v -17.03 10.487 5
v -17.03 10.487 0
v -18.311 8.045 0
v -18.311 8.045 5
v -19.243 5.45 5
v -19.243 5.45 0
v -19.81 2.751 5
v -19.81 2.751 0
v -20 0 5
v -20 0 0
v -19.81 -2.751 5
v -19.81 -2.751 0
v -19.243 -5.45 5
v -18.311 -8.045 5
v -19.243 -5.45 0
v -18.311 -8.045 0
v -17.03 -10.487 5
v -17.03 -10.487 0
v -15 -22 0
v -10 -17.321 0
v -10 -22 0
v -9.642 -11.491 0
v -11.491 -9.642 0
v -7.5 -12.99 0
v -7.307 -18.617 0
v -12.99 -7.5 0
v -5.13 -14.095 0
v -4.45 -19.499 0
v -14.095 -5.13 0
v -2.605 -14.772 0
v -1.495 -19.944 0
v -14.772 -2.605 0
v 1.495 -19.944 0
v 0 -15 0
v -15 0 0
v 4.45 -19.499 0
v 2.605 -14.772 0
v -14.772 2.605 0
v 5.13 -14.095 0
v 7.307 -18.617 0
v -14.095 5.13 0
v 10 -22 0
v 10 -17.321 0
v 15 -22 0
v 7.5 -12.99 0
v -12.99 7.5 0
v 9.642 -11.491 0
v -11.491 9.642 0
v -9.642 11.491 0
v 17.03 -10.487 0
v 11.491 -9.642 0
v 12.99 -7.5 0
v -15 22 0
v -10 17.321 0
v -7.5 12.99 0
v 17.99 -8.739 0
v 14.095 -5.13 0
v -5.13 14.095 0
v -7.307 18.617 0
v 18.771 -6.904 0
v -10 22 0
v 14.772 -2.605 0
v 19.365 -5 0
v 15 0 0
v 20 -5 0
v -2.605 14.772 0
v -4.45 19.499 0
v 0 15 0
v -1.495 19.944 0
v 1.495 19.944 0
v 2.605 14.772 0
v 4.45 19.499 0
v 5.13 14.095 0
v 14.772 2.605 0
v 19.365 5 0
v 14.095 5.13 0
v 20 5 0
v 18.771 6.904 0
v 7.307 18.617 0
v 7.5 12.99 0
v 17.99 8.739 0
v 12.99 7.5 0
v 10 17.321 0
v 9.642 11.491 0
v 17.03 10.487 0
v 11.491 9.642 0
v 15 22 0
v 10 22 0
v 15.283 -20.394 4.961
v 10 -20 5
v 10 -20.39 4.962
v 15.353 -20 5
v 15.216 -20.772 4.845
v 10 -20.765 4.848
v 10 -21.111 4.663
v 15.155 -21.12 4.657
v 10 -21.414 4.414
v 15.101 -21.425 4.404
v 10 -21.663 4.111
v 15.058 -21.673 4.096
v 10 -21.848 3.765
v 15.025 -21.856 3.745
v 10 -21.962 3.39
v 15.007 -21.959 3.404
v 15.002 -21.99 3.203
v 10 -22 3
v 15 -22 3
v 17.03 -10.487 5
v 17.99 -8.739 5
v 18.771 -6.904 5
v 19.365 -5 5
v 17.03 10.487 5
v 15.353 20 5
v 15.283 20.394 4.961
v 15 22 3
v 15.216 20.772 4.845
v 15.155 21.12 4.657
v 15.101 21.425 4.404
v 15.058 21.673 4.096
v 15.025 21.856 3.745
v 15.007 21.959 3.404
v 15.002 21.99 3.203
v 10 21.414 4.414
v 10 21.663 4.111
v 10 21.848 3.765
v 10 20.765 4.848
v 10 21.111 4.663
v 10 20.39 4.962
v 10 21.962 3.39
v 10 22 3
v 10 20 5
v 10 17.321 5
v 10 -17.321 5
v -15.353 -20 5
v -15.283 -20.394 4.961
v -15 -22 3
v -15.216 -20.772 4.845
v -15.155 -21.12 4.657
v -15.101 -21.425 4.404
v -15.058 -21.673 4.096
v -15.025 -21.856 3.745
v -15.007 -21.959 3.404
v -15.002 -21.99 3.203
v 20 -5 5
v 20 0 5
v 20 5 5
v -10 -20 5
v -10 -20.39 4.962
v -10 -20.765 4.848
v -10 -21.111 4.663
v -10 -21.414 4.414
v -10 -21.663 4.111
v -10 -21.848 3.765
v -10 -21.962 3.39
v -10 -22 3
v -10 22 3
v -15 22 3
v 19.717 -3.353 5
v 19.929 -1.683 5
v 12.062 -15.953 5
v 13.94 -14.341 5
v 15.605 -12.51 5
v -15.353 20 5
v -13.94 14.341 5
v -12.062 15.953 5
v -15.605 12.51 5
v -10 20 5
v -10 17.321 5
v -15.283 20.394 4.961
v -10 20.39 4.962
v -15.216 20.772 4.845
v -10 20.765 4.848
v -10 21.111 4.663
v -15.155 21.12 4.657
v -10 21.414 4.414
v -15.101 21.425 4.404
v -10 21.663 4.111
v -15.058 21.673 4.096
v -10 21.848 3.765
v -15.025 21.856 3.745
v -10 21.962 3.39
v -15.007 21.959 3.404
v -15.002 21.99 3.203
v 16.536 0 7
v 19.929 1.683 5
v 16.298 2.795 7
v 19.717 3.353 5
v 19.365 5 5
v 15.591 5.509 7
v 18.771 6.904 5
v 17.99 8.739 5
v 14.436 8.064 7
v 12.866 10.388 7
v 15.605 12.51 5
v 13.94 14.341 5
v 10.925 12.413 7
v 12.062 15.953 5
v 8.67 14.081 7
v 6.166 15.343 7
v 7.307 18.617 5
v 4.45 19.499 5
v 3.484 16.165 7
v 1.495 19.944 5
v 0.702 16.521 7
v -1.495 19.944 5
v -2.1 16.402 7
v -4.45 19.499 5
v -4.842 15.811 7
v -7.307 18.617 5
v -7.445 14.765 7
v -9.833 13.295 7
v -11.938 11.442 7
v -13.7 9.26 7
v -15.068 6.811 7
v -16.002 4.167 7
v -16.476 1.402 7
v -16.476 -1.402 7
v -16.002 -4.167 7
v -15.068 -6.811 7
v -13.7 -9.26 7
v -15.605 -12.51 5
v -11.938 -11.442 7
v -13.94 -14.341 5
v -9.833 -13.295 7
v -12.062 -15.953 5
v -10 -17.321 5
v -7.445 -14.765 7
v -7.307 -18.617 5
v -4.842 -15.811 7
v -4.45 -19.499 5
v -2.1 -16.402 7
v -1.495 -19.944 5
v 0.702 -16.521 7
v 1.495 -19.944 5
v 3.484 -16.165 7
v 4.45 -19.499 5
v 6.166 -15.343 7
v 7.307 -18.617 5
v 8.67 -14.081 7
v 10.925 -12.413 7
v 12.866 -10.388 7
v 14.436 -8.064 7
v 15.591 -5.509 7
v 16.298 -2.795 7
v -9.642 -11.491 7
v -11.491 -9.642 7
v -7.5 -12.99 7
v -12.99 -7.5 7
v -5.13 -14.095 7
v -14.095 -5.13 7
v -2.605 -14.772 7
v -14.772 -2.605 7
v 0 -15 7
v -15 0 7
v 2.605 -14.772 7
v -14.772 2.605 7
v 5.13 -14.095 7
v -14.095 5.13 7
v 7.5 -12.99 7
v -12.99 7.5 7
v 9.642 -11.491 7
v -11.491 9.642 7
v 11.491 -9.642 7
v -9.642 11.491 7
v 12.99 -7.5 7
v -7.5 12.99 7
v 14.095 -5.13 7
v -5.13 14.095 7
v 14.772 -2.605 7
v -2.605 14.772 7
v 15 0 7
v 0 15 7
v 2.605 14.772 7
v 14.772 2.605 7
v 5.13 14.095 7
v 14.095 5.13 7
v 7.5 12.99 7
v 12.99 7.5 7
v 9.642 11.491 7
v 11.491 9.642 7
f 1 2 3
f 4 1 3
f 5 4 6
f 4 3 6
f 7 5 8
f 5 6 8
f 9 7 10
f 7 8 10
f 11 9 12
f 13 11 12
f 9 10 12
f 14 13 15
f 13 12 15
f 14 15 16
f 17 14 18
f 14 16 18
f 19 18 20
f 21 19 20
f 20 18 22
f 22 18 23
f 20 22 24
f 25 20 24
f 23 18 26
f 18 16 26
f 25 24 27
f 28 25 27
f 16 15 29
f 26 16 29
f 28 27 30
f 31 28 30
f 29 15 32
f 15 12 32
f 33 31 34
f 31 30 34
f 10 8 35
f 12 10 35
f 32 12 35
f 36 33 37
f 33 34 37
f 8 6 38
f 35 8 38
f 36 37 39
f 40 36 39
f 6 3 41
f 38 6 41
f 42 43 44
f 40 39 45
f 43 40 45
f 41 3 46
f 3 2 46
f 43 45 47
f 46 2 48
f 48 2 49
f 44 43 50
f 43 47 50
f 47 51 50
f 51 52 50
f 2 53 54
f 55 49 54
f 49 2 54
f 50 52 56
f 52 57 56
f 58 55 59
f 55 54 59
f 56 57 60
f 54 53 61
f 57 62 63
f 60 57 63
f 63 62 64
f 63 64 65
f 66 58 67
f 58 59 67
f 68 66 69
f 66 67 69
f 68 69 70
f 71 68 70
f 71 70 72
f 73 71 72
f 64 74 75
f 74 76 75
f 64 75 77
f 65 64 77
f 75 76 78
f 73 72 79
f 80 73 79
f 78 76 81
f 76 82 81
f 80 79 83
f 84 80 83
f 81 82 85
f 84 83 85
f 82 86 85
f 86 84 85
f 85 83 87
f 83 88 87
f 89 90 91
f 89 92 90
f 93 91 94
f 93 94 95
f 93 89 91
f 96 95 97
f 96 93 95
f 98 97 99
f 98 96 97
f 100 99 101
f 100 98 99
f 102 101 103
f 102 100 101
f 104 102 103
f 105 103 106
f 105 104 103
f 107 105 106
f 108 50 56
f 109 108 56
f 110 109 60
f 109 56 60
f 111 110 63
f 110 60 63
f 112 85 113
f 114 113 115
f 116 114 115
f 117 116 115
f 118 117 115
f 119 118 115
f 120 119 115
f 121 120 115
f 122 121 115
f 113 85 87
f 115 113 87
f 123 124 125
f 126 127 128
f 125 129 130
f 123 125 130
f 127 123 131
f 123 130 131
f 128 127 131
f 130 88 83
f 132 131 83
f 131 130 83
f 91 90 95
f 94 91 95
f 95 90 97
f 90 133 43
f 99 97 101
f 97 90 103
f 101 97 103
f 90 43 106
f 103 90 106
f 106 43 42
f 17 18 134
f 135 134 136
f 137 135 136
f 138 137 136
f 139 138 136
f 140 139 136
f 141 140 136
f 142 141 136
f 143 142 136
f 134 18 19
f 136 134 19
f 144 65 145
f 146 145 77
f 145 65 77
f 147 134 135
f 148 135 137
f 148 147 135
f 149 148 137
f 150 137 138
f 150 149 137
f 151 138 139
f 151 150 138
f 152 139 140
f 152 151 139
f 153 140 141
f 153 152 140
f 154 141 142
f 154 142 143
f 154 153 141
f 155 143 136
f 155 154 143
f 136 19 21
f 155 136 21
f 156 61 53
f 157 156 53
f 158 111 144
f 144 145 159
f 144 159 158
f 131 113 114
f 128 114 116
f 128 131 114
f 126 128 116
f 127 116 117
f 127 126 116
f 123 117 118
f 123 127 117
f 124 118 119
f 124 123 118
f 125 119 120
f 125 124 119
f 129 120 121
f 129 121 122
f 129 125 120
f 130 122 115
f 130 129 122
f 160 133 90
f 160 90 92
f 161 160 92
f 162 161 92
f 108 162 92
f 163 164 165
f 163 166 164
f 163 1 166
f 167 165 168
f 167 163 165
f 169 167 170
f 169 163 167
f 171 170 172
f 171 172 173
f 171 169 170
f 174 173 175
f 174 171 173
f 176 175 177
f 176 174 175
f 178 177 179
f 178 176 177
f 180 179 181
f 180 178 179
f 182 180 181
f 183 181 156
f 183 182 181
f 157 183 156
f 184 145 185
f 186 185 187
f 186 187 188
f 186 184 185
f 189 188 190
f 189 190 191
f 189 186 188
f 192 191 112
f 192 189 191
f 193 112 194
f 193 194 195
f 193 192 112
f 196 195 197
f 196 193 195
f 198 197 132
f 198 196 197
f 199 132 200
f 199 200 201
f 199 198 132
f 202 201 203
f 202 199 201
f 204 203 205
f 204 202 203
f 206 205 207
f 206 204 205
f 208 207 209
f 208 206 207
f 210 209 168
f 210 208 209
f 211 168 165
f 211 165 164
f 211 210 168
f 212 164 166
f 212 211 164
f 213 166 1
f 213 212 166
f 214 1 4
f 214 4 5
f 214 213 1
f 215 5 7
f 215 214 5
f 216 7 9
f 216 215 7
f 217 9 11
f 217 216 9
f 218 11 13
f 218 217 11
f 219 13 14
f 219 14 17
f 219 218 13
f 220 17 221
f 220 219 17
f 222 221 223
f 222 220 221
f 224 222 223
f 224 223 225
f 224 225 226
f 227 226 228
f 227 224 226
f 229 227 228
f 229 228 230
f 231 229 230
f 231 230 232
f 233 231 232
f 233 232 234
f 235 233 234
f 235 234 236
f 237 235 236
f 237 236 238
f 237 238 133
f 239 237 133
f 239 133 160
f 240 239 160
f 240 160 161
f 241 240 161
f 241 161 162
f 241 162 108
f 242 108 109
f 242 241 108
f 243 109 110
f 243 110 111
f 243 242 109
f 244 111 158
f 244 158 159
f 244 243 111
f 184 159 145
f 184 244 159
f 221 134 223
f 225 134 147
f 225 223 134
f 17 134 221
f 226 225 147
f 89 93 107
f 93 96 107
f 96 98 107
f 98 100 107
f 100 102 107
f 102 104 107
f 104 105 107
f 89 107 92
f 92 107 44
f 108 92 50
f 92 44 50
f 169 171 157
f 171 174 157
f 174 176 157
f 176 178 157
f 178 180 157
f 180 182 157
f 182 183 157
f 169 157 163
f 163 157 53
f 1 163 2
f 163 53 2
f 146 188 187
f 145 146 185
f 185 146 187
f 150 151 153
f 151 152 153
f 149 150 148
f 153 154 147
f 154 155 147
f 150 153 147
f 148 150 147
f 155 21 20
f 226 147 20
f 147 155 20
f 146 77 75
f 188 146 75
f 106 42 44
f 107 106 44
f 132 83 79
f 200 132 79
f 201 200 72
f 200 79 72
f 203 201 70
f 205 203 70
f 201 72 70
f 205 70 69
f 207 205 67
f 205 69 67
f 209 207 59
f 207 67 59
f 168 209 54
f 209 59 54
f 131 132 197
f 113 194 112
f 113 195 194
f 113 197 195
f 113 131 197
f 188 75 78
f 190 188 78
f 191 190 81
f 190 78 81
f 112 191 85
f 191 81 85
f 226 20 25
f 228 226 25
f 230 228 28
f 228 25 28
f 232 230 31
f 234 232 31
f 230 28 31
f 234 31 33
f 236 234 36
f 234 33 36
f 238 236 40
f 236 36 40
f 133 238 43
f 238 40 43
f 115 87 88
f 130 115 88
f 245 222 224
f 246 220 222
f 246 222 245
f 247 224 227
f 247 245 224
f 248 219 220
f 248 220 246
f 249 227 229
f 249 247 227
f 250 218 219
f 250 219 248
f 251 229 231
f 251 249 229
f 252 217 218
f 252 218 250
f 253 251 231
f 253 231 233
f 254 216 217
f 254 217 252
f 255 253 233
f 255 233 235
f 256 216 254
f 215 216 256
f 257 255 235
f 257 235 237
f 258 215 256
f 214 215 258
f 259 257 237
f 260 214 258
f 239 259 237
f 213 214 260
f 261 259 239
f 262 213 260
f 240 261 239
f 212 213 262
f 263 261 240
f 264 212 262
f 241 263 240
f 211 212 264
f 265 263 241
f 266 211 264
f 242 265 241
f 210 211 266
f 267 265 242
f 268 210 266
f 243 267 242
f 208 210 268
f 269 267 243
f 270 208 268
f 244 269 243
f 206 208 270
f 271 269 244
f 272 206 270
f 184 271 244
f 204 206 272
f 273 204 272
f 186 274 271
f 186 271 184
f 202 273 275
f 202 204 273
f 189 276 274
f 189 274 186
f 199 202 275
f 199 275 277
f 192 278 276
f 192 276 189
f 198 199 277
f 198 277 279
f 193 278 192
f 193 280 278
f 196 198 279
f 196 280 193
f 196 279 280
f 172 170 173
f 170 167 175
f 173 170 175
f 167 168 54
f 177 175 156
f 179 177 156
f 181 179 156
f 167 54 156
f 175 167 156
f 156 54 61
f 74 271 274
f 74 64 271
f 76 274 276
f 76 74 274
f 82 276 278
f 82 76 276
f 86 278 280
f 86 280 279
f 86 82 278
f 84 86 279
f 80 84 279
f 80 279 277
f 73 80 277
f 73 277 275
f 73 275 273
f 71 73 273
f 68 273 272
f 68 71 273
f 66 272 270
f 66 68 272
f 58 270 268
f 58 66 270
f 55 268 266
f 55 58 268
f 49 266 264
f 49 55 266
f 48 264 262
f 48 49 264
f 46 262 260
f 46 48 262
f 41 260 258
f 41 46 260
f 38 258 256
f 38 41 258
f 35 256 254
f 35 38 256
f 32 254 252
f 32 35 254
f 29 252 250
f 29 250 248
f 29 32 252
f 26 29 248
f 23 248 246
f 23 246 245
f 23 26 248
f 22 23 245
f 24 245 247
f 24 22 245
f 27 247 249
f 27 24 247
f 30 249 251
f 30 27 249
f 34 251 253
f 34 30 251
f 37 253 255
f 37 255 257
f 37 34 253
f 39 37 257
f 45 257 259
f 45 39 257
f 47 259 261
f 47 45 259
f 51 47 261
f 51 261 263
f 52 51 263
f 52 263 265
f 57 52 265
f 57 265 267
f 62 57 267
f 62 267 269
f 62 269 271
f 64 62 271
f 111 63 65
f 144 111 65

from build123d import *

# Parameters (mm, degrees)
ESQUISSE1_R        = 15
BOSS_EXTRU_1_DEPTH = 5
ESQUISSE5_R        = 20
ESQUISSE5_R_2      = 15
BOSS_EXTRU_2_DEPTH = 2
CHANFREIN2_SIZE    = 2
CHANFREIN2_SIZE_2  = 3.464101615
CONG_1_R           = 2


with BuildPart() as part:
    # Esquisse1 → Boss.-Extru.1 (new body)
    with BuildSketch(Plane.XY):
        with BuildLine():
            Line((-10, 17.320508076), (-10, 22))
            Line((-10, 22), (-15, 22))
            Line((-15, 22), (-17.030050858, 10.487009478))
            ThreePointArc((-17.030050858, 10.487009478), (-20, 0), (-17.030050858, -10.487009478))
            Line((-17.030050858, -10.487009478), (-15, -22))
            Line((-15, -22), (-10, -22))
            Line((-10, -22), (-10, -17.320508076))
            ThreePointArc((-10, -17.320508076), (0, -20), (10, -17.320508076))
            Line((10, -17.320508076), (10, -22))
            Line((10, -22), (15, -22))
            Line((15, -22), (17.030050858, -10.487009478))
            ThreePointArc((17.030050858, -10.487009478), (18.403131111, -7.831013044), (19.364916731, -5))
            Line((19.364916731, -5), (20, -5))
            Line((20, -5), (20, 5))
            Line((20, 5), (19.364916731, 5))
            ThreePointArc((19.364916731, 5), (18.403131111, 7.831013044), (17.030050858, 10.487009478))
            Line((17.030050858, 10.487009478), (15, 22))
            Line((15, 22), (10, 22))
            Line((10, 22), (10, 17.320508076))
            ThreePointArc((10, 17.320508076), (0, 20), (-10, 17.320508076))
        make_face()
        Circle(ESQUISSE1_R, mode=Mode.SUBTRACT)
    extrude(amount=BOSS_EXTRU_1_DEPTH)

    # Esquisse5 → Boss.-Extru.2 (add)
    with BuildSketch(Plane.XY.offset(5)):
        Circle(ESQUISSE5_R)
        Circle(ESQUISSE5_R_2, mode=Mode.SUBTRACT)
    extrude(amount=BOSS_EXTRU_2_DEPTH)

    # Chanfrein2
    # the kernel refuses this chamfer: 3.464101615, 2 mm, written as the material it takes off along each edge
    with BuildSketch(Plane(origin=(0, 0, 7), x_dir=(1, 0, 0), z_dir=(0, -1, 0))) as chanfrein2_piece_1:
        Polygon((20, -CHANFREIN2_SIZE), (20 - CHANFREIN2_SIZE_2, 0), (20, 0), align=None)
    revolve(axis=Axis((0, 0, 7), (0, 0, 1)), mode=Mode.SUBTRACT)

    # Congé1
    cong_1_edges = [part.edges().sort_by_distance(p)[0] for p in [
        (12.5, -22, 5),
        (-12.5, -22, 5),
        (12.5, 22, 5),
        (-12.5, 22, 5),
    ]]
    fillet(cong_1_edges, radius=CONG_1_R)


solid = part.part
